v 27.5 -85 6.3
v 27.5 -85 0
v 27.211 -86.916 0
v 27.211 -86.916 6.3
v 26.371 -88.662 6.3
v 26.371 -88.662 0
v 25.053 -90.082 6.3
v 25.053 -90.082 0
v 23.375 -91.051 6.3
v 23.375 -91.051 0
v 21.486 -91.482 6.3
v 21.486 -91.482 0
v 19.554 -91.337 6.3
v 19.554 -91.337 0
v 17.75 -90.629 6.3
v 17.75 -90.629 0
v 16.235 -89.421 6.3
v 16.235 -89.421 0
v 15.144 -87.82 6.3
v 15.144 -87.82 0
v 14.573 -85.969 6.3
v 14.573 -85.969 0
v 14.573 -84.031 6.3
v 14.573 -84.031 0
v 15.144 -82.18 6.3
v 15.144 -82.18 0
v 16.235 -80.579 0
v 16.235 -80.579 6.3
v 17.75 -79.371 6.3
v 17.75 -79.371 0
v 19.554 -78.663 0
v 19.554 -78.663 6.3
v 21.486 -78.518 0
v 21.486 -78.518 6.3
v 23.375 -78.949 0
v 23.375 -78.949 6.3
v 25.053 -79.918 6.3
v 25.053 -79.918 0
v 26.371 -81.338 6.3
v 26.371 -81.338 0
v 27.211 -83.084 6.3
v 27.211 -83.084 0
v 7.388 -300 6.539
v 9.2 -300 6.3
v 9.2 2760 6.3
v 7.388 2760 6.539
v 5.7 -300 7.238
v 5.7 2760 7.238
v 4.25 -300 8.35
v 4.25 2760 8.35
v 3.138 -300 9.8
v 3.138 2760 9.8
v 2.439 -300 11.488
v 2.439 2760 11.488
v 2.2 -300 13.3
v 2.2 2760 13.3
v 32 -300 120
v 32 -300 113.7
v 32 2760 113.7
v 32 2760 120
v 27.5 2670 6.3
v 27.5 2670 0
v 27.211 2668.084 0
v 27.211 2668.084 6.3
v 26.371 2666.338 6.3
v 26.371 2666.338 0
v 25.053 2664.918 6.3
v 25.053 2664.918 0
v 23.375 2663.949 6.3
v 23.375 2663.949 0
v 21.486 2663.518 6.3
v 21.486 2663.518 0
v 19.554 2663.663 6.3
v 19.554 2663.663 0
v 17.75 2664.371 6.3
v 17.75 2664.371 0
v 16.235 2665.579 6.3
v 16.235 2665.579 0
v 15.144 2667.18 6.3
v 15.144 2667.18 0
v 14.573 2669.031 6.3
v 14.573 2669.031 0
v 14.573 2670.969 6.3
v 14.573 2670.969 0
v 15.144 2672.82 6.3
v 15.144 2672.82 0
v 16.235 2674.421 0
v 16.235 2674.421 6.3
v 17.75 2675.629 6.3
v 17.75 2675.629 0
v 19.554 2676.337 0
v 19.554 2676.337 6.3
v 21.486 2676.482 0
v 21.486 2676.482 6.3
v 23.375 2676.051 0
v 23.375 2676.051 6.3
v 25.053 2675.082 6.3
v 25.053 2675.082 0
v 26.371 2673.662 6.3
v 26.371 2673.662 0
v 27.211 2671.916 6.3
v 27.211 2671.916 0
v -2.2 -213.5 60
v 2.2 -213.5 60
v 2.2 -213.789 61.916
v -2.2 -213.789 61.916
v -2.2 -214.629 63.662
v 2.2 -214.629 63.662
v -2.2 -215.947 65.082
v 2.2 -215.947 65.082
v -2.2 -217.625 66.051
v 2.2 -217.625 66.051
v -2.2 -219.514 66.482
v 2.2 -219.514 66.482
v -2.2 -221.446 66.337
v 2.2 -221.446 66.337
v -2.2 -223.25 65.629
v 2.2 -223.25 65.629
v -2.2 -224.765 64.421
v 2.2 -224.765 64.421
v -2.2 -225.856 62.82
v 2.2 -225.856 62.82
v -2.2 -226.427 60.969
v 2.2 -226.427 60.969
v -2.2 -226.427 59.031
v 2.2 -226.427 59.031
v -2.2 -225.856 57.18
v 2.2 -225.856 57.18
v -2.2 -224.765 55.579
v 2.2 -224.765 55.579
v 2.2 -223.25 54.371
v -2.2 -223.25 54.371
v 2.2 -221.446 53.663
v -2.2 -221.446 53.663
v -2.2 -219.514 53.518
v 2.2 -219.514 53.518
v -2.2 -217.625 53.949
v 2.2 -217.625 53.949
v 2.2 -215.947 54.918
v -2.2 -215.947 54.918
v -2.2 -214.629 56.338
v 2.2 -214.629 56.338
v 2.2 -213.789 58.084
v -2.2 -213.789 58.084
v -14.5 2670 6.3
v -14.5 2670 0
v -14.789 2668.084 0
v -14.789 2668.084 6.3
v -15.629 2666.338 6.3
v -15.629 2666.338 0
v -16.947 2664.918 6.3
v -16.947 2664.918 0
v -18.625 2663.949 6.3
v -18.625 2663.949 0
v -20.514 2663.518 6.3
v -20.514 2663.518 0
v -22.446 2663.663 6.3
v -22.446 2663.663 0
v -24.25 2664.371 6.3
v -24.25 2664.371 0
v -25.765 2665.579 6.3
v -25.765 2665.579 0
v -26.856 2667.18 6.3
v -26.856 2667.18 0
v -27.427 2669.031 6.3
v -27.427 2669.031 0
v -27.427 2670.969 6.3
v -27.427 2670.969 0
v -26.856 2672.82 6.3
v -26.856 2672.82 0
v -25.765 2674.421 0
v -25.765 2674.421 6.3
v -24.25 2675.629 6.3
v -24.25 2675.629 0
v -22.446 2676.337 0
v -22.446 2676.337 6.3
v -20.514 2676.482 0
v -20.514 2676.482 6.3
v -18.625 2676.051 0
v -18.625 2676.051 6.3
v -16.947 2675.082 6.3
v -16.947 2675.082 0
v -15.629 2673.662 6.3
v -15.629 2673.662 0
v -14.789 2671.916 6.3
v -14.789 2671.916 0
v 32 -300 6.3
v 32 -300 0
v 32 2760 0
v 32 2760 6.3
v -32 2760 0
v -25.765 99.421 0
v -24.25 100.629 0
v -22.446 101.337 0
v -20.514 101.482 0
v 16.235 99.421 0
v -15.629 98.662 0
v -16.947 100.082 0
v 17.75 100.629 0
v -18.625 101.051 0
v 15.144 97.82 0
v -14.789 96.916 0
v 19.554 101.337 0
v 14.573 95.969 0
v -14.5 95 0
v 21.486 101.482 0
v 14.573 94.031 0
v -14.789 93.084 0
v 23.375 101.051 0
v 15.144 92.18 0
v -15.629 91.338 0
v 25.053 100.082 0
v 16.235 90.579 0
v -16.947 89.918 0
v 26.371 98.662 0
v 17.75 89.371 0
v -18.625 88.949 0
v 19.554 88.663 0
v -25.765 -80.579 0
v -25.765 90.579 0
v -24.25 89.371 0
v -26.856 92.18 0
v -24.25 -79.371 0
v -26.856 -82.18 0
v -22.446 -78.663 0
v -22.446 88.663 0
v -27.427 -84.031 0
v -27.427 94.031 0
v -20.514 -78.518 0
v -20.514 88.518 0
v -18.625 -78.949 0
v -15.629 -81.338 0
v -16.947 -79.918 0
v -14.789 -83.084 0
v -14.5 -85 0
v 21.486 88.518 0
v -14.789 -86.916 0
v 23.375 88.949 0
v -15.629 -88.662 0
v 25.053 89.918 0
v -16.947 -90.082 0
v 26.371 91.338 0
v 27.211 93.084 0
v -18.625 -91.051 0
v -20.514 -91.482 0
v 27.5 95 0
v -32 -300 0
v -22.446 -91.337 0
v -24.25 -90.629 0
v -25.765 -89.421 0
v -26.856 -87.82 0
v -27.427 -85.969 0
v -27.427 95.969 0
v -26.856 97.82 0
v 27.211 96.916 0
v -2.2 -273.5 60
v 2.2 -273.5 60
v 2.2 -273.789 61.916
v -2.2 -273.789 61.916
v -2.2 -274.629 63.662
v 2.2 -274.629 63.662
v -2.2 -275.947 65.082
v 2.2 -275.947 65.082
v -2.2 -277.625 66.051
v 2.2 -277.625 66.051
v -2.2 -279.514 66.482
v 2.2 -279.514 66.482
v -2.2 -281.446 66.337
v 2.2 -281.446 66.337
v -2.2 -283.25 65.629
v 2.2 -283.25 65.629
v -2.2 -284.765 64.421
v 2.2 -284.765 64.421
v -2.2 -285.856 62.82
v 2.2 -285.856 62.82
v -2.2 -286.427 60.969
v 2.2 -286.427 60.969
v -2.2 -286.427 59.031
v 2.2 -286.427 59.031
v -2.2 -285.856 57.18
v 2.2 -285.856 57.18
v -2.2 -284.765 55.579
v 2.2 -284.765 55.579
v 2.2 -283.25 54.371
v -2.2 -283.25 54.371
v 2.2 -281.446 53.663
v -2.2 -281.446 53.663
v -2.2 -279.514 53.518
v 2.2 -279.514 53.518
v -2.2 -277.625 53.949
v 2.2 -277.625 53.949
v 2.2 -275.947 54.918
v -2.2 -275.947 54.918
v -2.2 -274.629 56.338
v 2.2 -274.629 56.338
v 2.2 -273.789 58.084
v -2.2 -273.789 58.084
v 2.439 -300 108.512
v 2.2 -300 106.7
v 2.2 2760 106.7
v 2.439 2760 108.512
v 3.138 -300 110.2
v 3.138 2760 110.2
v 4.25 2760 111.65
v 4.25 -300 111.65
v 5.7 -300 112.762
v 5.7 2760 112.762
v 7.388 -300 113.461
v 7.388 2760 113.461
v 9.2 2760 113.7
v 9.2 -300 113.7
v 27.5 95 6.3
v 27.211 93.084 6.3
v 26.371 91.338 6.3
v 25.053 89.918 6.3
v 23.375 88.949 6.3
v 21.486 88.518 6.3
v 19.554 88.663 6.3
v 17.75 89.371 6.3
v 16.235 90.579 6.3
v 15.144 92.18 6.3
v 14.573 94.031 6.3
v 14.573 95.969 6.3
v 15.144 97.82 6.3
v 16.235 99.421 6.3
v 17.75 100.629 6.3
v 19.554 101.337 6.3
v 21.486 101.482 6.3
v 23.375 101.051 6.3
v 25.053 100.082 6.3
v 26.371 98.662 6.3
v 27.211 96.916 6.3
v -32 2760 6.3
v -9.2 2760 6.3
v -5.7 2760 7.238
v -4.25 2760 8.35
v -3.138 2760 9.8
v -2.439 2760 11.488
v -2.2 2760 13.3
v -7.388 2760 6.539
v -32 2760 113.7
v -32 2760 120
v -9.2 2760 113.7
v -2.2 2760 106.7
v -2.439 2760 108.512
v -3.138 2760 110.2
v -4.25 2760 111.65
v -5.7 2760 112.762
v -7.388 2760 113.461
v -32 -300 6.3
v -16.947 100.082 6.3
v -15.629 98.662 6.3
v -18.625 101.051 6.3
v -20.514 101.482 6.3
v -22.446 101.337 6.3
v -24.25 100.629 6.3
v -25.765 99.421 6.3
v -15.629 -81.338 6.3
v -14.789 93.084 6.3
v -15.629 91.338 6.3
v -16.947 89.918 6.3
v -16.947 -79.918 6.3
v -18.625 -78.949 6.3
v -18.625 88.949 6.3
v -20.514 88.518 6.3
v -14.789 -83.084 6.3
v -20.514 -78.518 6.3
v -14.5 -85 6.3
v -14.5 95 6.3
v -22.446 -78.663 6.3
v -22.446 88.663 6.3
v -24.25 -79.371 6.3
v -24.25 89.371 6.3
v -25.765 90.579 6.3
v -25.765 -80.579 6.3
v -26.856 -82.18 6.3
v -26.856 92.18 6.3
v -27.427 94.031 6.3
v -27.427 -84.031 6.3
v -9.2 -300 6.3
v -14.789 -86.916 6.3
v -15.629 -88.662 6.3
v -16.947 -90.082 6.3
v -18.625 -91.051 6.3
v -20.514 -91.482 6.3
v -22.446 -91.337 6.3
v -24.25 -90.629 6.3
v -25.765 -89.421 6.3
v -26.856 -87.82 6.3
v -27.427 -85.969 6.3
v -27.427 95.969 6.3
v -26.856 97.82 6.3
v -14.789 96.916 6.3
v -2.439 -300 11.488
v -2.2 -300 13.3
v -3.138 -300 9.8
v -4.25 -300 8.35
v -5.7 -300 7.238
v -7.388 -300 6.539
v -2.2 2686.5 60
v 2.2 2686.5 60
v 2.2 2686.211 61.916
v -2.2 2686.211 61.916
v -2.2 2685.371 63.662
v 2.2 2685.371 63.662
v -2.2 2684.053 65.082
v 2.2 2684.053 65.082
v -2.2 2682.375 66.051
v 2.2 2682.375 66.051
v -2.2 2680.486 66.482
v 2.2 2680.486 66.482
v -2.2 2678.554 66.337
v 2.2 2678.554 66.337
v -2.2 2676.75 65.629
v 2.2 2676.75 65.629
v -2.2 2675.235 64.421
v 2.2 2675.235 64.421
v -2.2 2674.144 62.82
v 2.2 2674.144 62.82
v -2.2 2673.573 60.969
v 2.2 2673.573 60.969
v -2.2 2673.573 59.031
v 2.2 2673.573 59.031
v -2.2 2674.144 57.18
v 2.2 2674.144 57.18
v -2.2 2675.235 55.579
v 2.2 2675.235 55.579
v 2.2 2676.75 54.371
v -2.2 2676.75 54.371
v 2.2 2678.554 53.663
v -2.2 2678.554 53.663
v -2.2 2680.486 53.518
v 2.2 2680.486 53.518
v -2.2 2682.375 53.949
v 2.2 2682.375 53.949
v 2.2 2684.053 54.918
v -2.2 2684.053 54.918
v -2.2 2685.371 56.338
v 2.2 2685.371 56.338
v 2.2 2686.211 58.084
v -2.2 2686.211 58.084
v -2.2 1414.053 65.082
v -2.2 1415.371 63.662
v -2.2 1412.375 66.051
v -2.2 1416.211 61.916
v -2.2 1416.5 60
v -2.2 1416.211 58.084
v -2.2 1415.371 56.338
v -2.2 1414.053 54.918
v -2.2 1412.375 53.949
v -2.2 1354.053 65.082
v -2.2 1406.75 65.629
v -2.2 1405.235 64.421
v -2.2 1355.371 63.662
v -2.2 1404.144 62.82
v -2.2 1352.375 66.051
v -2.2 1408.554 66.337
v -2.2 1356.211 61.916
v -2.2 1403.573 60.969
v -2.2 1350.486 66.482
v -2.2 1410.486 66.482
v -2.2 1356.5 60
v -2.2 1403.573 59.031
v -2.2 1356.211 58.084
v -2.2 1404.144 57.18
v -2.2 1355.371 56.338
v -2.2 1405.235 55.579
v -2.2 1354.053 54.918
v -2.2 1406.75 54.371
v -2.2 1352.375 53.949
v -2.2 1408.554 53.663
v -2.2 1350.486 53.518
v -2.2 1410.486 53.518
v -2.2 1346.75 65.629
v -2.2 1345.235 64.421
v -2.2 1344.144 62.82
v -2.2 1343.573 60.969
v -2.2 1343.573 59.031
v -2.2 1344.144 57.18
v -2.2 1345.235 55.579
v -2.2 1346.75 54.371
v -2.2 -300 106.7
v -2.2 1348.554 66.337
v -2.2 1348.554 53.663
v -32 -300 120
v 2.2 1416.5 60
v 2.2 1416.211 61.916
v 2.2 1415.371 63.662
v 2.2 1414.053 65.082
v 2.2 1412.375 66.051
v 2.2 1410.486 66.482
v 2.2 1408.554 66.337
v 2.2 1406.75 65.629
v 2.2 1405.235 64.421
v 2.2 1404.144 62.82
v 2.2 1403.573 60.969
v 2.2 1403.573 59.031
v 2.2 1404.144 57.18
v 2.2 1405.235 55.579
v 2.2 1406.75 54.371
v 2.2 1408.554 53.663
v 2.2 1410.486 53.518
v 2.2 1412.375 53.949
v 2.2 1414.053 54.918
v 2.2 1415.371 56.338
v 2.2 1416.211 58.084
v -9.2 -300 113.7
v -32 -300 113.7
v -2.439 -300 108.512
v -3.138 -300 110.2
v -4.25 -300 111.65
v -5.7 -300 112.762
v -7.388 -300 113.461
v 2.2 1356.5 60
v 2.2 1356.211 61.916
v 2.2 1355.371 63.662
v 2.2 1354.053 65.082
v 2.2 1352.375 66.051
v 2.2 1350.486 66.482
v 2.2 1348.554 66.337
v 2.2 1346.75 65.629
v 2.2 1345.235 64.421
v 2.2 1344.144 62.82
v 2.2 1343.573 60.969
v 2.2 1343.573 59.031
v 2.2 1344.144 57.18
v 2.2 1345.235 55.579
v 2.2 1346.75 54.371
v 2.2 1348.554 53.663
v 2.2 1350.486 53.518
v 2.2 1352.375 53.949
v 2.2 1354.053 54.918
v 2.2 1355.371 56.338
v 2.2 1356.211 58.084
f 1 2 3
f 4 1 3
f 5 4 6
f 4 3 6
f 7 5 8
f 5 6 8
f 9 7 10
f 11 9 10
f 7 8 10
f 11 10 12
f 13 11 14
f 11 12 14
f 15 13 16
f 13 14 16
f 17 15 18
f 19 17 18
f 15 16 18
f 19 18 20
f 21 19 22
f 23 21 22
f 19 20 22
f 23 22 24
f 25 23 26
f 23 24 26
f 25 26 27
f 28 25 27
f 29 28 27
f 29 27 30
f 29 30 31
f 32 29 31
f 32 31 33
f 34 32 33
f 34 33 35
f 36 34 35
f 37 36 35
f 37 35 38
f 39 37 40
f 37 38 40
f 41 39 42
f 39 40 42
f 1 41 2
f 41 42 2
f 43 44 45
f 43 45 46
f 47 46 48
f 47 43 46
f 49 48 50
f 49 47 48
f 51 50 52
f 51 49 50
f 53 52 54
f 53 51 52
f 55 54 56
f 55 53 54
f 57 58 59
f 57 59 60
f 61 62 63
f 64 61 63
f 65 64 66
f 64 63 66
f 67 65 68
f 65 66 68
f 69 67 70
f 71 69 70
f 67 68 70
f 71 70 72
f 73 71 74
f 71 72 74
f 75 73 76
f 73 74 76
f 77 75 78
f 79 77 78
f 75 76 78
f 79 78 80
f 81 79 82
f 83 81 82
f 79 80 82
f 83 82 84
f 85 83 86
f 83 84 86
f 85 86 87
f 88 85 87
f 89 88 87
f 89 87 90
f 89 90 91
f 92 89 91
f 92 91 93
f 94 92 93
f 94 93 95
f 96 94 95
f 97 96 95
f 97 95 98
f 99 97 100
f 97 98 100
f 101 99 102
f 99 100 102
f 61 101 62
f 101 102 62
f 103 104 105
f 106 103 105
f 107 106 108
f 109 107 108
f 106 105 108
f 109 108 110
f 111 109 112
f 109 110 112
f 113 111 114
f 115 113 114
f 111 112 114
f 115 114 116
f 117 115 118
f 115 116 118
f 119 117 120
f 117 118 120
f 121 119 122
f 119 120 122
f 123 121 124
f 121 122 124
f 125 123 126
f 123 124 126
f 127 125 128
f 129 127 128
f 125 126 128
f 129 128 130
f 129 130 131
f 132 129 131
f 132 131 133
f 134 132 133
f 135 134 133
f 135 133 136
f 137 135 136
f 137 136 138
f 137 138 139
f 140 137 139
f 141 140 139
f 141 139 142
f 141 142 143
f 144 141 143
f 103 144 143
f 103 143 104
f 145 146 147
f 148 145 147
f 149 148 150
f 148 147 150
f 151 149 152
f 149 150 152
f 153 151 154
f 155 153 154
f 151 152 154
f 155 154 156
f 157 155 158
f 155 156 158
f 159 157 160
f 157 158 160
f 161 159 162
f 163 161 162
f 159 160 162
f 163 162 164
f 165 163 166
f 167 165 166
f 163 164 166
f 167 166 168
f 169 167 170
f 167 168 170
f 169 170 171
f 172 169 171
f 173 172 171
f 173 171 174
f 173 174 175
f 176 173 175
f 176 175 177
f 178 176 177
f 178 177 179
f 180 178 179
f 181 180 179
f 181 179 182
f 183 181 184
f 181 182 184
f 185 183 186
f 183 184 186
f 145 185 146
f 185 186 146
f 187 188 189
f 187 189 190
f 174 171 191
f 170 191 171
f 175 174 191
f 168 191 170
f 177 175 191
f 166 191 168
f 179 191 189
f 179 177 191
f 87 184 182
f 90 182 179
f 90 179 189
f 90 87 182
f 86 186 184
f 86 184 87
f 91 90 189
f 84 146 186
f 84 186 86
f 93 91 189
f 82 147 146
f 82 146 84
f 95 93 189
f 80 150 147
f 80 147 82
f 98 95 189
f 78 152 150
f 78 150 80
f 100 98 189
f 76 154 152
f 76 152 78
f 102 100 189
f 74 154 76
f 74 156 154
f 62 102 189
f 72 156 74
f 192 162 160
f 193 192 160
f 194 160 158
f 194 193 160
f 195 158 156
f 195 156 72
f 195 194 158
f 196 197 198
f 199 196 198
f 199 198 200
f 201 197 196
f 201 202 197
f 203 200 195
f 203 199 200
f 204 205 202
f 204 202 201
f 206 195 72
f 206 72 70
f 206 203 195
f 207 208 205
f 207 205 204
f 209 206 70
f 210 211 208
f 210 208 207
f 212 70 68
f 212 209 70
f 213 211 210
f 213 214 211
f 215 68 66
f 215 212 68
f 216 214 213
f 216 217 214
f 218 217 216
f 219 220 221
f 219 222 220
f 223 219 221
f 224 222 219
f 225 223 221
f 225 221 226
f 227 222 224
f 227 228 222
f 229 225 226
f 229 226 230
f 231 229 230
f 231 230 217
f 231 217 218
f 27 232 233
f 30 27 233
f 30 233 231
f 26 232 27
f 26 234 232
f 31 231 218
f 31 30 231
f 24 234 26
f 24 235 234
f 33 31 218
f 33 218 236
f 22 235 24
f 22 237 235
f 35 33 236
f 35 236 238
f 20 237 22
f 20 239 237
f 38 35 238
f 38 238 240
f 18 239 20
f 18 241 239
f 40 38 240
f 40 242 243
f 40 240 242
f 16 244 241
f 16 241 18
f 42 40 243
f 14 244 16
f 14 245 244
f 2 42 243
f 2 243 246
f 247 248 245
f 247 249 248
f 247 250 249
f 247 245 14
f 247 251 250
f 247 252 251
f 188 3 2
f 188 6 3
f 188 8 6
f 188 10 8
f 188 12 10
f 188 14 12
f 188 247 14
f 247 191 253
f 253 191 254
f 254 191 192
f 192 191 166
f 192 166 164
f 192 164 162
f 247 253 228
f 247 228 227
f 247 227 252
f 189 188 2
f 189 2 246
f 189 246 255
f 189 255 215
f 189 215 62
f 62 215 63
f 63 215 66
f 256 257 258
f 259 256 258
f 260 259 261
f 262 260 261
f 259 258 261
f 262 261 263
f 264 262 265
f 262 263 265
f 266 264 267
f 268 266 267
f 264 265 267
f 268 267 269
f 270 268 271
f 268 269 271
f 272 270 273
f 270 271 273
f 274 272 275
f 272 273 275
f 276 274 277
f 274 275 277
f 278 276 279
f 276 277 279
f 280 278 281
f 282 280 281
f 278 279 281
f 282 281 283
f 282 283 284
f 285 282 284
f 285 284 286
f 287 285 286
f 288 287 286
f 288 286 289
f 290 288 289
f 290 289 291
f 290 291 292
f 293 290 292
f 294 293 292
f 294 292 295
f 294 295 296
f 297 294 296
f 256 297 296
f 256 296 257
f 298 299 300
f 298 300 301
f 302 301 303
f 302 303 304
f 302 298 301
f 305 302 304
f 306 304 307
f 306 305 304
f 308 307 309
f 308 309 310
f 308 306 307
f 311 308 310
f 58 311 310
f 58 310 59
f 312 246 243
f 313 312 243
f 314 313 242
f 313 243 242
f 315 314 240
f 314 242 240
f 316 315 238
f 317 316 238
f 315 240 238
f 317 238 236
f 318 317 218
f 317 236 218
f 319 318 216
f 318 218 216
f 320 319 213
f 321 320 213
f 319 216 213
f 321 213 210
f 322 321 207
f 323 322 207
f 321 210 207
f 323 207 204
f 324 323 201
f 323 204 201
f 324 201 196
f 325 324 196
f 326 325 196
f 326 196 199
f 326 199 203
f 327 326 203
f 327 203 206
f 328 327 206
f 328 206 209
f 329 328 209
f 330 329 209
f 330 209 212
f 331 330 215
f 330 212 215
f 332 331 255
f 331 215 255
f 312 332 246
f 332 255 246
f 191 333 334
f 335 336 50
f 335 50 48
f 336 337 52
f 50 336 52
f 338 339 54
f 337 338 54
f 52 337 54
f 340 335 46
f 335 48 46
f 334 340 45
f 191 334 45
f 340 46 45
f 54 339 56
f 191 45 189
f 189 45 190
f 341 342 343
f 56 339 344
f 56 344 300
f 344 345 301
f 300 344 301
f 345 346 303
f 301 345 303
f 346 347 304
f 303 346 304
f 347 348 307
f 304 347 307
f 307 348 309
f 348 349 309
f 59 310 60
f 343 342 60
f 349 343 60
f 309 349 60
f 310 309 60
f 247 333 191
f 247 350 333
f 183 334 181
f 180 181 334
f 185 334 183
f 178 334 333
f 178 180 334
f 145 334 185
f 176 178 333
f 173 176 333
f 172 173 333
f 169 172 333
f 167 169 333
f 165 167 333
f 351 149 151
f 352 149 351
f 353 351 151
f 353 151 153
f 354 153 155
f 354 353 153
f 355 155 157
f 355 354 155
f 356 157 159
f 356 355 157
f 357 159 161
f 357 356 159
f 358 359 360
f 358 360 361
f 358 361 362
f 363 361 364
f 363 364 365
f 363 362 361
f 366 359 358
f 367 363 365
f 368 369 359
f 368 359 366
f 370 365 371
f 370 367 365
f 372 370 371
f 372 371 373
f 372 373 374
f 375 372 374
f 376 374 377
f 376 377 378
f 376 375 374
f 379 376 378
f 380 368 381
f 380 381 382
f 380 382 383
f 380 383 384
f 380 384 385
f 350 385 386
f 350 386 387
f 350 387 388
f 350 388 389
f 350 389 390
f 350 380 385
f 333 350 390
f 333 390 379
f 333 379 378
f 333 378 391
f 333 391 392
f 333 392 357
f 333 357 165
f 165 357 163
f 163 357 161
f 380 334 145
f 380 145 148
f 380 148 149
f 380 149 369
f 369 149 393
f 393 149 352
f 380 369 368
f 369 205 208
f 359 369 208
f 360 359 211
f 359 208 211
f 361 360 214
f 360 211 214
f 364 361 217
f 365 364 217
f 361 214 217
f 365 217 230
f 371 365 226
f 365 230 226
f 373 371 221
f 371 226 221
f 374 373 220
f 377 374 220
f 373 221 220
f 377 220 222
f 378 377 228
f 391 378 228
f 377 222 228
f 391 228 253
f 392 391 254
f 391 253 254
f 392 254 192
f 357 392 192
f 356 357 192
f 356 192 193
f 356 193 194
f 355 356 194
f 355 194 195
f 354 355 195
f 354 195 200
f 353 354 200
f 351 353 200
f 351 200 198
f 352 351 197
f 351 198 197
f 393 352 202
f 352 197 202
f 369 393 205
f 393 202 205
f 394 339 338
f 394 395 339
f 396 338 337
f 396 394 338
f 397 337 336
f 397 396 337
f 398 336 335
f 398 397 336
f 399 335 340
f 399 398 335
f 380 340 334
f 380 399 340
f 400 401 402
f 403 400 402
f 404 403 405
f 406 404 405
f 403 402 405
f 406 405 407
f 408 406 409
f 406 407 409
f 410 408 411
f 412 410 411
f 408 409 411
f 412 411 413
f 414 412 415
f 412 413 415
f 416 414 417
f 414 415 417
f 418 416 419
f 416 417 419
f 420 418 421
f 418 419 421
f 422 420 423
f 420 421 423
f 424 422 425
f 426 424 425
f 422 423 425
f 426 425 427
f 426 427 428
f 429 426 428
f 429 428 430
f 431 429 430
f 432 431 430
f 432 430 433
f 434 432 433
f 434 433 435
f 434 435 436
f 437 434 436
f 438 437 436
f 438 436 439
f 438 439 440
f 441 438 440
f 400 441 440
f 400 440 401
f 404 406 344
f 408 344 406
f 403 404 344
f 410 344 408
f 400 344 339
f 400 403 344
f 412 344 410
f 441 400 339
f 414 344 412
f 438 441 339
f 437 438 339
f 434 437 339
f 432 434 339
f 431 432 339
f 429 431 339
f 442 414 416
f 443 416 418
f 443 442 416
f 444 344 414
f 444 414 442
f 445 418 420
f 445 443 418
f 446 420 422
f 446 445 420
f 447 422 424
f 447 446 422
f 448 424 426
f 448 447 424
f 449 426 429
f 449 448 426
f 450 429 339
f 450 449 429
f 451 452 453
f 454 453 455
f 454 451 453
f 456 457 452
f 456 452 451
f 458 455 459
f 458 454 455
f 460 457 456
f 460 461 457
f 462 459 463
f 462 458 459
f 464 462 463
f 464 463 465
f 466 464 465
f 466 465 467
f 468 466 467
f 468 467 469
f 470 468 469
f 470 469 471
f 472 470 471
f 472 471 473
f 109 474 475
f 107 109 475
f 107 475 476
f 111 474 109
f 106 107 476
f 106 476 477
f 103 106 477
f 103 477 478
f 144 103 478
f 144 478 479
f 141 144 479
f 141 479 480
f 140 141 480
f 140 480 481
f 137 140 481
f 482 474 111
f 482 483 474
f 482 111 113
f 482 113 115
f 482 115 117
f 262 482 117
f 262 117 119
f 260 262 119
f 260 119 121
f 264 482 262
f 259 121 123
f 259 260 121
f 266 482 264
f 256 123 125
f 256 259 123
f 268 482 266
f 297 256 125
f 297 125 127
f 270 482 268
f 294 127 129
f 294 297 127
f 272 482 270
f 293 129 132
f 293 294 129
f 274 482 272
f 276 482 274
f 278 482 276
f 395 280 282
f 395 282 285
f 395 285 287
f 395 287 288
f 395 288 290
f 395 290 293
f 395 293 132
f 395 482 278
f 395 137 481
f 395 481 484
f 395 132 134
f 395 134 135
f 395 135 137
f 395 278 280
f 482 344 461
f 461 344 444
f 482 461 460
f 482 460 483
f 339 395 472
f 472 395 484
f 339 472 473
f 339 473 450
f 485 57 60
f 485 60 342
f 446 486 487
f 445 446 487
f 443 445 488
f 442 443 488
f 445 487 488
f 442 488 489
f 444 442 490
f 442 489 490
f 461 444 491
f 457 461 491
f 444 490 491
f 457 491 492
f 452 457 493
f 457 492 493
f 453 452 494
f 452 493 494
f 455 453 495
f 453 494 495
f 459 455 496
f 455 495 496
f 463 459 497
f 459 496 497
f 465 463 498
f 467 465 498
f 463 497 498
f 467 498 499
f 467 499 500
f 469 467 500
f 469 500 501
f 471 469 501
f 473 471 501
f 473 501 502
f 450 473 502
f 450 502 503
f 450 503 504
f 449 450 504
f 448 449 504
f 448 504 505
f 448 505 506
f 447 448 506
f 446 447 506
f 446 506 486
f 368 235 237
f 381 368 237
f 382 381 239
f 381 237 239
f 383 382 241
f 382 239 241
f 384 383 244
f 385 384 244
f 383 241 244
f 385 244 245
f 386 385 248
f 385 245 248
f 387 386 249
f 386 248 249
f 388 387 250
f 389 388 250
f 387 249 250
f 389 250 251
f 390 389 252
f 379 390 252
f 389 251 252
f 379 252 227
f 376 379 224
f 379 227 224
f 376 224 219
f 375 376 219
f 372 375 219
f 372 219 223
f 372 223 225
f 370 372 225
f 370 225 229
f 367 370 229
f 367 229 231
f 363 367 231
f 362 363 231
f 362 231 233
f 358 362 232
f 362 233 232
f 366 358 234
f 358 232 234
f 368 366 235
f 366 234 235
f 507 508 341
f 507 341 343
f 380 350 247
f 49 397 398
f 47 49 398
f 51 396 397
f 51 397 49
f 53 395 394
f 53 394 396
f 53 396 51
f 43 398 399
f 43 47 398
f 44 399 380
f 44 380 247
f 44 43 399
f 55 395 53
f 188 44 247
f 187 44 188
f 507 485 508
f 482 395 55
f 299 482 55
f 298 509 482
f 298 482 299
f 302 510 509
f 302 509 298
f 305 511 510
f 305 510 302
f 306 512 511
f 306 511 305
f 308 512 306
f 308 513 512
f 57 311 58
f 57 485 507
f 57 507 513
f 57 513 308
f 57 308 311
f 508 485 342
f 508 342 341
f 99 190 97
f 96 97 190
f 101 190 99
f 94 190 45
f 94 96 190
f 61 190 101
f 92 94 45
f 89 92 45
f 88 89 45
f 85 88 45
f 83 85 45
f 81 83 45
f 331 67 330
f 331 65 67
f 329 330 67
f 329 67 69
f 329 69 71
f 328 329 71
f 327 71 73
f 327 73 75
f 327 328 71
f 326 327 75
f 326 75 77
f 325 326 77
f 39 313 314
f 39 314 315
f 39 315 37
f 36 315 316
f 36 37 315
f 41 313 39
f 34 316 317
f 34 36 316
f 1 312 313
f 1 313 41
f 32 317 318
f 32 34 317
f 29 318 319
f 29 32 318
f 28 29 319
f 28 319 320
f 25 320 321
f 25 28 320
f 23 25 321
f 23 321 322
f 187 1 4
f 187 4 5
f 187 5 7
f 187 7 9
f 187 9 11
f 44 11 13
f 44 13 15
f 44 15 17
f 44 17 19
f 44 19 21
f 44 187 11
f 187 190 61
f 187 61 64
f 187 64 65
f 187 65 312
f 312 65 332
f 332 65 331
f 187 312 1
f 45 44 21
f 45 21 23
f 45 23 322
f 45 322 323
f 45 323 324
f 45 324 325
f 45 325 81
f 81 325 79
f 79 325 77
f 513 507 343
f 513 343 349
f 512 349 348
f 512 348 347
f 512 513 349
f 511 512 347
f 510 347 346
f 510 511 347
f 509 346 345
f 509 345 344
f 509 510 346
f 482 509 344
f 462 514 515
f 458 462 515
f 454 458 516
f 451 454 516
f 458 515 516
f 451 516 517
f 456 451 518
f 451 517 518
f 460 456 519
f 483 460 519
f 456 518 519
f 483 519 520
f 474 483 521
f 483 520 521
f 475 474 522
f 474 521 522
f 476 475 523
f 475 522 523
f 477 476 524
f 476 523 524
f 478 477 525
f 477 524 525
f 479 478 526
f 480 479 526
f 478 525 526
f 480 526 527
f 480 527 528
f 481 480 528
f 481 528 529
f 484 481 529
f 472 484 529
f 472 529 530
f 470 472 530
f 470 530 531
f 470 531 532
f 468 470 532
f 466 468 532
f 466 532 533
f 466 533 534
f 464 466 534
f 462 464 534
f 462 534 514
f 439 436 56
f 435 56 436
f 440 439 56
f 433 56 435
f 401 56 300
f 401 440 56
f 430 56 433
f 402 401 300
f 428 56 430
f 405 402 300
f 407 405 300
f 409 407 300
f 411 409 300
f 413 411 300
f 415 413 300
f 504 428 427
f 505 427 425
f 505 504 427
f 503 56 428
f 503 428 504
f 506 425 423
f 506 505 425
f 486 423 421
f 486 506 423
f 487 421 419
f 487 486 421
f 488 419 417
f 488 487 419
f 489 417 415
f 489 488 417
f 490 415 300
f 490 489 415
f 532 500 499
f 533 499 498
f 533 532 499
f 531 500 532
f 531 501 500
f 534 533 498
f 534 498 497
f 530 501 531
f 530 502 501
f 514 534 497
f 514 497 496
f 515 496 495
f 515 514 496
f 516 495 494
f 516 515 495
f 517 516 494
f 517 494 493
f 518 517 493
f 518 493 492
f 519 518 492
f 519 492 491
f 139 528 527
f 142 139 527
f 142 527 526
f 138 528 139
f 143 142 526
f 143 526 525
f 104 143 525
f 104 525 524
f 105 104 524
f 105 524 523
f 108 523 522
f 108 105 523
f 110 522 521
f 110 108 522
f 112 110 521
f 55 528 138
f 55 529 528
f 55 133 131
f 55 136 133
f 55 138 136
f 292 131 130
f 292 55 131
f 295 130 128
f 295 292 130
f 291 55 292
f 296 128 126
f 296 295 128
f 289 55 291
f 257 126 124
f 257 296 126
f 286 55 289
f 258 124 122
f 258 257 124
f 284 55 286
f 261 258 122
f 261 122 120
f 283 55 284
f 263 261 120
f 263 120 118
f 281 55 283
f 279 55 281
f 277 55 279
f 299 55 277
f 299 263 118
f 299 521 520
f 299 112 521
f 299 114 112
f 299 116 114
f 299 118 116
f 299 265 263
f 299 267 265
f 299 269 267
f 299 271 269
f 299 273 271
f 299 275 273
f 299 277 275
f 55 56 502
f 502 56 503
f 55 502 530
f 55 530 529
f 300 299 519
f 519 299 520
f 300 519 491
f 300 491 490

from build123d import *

# Parameters (mm, degrees)
F1_DEPTH      = 300
F1_DEPTH_BACK = 2760
F2_R          = 6.5
F3_DEPTH      = 6.3
F4_R          = 6.5
F5_DEPTH      = 34.201


# Not quite as in the source:
# - a feature names something its author has since deleted; it is built from what else it names


with BuildPart() as f1:
    # F0 (on Front) → F1 (new body, two sides)
    with BuildSketch(Plane.XZ) as f1_sk:
        with BuildLine():
            Line((-32, 6.3), (-32, 0))
            Line((-32, 0), (32, 0))
            Line((32, 0), (32, 6.3))
            Line((32, 6.3), (9.2, 6.3))
            ThreePointArc((9.2, 6.3), (4.2502525317, 8.3502525317), (2.2, 13.3))
            Line((2.2, 13.3), (2.2, 106.7))
            ThreePointArc((2.2, 106.7), (4.2502525317, 111.6497474683), (9.2, 113.7))
            Line((9.2, 113.7), (32, 113.7))
            Line((32, 113.7), (32, 120))
            Line((32, 120), (-32, 120))
            Line((-32, 120), (-32, 113.7))
            Line((-32, 113.7), (-9.2, 113.7))
            ThreePointArc((-9.2, 113.7), (-4.2502525317, 111.6497474683), (-2.2, 106.7))
            Line((-2.2, 106.7), (-2.2, 13.3))
            ThreePointArc((-2.2, 13.3), (-4.2502525317, 8.3502525317), (-9.2, 6.3))
            Line((-9.2, 6.3), (-32, 6.3))
        make_face()
    extrude(amount=F1_DEPTH)
    extrude(f1_sk.sketch, amount=-F1_DEPTH_BACK)

    # F2 (on face) → F3 (cut, through all)
    with BuildSketch(Plane(origin=(0, 0, 0), x_dir=(1, 0, 0), z_dir=(0, 0, -1))):
        with Locations((21, 85)):
            Circle(F2_R)
        with Locations((-21, 85)):
            Circle(F2_R)
        with Locations((-21, -95)):
            Circle(F2_R)
        with Locations((21, -95)):
            Circle(F2_R)
        with Locations((-21, -2670)):
            Circle(F2_R)
        with Locations((21, -2670)):
            Circle(F2_R)
    extrude(amount=-F3_DEPTH, mode=Mode.SUBTRACT)

    # F4 (on face) → F5 (cut, through all)
    with BuildSketch(Plane.YZ.offset(2.2)):
        with Locations((2680, 60)):
            Circle(F4_R)
        with Locations((-280, 60)):
            Circle(F4_R)
        with Locations((-220, 60)):
            Circle(F4_R)
        with Locations((1350, 60)):
            Circle(F4_R)
        with Locations((1410, 60)):
            Circle(F4_R)
    extrude(amount=-F5_DEPTH, mode=Mode.SUBTRACT)


solid = f1.part
